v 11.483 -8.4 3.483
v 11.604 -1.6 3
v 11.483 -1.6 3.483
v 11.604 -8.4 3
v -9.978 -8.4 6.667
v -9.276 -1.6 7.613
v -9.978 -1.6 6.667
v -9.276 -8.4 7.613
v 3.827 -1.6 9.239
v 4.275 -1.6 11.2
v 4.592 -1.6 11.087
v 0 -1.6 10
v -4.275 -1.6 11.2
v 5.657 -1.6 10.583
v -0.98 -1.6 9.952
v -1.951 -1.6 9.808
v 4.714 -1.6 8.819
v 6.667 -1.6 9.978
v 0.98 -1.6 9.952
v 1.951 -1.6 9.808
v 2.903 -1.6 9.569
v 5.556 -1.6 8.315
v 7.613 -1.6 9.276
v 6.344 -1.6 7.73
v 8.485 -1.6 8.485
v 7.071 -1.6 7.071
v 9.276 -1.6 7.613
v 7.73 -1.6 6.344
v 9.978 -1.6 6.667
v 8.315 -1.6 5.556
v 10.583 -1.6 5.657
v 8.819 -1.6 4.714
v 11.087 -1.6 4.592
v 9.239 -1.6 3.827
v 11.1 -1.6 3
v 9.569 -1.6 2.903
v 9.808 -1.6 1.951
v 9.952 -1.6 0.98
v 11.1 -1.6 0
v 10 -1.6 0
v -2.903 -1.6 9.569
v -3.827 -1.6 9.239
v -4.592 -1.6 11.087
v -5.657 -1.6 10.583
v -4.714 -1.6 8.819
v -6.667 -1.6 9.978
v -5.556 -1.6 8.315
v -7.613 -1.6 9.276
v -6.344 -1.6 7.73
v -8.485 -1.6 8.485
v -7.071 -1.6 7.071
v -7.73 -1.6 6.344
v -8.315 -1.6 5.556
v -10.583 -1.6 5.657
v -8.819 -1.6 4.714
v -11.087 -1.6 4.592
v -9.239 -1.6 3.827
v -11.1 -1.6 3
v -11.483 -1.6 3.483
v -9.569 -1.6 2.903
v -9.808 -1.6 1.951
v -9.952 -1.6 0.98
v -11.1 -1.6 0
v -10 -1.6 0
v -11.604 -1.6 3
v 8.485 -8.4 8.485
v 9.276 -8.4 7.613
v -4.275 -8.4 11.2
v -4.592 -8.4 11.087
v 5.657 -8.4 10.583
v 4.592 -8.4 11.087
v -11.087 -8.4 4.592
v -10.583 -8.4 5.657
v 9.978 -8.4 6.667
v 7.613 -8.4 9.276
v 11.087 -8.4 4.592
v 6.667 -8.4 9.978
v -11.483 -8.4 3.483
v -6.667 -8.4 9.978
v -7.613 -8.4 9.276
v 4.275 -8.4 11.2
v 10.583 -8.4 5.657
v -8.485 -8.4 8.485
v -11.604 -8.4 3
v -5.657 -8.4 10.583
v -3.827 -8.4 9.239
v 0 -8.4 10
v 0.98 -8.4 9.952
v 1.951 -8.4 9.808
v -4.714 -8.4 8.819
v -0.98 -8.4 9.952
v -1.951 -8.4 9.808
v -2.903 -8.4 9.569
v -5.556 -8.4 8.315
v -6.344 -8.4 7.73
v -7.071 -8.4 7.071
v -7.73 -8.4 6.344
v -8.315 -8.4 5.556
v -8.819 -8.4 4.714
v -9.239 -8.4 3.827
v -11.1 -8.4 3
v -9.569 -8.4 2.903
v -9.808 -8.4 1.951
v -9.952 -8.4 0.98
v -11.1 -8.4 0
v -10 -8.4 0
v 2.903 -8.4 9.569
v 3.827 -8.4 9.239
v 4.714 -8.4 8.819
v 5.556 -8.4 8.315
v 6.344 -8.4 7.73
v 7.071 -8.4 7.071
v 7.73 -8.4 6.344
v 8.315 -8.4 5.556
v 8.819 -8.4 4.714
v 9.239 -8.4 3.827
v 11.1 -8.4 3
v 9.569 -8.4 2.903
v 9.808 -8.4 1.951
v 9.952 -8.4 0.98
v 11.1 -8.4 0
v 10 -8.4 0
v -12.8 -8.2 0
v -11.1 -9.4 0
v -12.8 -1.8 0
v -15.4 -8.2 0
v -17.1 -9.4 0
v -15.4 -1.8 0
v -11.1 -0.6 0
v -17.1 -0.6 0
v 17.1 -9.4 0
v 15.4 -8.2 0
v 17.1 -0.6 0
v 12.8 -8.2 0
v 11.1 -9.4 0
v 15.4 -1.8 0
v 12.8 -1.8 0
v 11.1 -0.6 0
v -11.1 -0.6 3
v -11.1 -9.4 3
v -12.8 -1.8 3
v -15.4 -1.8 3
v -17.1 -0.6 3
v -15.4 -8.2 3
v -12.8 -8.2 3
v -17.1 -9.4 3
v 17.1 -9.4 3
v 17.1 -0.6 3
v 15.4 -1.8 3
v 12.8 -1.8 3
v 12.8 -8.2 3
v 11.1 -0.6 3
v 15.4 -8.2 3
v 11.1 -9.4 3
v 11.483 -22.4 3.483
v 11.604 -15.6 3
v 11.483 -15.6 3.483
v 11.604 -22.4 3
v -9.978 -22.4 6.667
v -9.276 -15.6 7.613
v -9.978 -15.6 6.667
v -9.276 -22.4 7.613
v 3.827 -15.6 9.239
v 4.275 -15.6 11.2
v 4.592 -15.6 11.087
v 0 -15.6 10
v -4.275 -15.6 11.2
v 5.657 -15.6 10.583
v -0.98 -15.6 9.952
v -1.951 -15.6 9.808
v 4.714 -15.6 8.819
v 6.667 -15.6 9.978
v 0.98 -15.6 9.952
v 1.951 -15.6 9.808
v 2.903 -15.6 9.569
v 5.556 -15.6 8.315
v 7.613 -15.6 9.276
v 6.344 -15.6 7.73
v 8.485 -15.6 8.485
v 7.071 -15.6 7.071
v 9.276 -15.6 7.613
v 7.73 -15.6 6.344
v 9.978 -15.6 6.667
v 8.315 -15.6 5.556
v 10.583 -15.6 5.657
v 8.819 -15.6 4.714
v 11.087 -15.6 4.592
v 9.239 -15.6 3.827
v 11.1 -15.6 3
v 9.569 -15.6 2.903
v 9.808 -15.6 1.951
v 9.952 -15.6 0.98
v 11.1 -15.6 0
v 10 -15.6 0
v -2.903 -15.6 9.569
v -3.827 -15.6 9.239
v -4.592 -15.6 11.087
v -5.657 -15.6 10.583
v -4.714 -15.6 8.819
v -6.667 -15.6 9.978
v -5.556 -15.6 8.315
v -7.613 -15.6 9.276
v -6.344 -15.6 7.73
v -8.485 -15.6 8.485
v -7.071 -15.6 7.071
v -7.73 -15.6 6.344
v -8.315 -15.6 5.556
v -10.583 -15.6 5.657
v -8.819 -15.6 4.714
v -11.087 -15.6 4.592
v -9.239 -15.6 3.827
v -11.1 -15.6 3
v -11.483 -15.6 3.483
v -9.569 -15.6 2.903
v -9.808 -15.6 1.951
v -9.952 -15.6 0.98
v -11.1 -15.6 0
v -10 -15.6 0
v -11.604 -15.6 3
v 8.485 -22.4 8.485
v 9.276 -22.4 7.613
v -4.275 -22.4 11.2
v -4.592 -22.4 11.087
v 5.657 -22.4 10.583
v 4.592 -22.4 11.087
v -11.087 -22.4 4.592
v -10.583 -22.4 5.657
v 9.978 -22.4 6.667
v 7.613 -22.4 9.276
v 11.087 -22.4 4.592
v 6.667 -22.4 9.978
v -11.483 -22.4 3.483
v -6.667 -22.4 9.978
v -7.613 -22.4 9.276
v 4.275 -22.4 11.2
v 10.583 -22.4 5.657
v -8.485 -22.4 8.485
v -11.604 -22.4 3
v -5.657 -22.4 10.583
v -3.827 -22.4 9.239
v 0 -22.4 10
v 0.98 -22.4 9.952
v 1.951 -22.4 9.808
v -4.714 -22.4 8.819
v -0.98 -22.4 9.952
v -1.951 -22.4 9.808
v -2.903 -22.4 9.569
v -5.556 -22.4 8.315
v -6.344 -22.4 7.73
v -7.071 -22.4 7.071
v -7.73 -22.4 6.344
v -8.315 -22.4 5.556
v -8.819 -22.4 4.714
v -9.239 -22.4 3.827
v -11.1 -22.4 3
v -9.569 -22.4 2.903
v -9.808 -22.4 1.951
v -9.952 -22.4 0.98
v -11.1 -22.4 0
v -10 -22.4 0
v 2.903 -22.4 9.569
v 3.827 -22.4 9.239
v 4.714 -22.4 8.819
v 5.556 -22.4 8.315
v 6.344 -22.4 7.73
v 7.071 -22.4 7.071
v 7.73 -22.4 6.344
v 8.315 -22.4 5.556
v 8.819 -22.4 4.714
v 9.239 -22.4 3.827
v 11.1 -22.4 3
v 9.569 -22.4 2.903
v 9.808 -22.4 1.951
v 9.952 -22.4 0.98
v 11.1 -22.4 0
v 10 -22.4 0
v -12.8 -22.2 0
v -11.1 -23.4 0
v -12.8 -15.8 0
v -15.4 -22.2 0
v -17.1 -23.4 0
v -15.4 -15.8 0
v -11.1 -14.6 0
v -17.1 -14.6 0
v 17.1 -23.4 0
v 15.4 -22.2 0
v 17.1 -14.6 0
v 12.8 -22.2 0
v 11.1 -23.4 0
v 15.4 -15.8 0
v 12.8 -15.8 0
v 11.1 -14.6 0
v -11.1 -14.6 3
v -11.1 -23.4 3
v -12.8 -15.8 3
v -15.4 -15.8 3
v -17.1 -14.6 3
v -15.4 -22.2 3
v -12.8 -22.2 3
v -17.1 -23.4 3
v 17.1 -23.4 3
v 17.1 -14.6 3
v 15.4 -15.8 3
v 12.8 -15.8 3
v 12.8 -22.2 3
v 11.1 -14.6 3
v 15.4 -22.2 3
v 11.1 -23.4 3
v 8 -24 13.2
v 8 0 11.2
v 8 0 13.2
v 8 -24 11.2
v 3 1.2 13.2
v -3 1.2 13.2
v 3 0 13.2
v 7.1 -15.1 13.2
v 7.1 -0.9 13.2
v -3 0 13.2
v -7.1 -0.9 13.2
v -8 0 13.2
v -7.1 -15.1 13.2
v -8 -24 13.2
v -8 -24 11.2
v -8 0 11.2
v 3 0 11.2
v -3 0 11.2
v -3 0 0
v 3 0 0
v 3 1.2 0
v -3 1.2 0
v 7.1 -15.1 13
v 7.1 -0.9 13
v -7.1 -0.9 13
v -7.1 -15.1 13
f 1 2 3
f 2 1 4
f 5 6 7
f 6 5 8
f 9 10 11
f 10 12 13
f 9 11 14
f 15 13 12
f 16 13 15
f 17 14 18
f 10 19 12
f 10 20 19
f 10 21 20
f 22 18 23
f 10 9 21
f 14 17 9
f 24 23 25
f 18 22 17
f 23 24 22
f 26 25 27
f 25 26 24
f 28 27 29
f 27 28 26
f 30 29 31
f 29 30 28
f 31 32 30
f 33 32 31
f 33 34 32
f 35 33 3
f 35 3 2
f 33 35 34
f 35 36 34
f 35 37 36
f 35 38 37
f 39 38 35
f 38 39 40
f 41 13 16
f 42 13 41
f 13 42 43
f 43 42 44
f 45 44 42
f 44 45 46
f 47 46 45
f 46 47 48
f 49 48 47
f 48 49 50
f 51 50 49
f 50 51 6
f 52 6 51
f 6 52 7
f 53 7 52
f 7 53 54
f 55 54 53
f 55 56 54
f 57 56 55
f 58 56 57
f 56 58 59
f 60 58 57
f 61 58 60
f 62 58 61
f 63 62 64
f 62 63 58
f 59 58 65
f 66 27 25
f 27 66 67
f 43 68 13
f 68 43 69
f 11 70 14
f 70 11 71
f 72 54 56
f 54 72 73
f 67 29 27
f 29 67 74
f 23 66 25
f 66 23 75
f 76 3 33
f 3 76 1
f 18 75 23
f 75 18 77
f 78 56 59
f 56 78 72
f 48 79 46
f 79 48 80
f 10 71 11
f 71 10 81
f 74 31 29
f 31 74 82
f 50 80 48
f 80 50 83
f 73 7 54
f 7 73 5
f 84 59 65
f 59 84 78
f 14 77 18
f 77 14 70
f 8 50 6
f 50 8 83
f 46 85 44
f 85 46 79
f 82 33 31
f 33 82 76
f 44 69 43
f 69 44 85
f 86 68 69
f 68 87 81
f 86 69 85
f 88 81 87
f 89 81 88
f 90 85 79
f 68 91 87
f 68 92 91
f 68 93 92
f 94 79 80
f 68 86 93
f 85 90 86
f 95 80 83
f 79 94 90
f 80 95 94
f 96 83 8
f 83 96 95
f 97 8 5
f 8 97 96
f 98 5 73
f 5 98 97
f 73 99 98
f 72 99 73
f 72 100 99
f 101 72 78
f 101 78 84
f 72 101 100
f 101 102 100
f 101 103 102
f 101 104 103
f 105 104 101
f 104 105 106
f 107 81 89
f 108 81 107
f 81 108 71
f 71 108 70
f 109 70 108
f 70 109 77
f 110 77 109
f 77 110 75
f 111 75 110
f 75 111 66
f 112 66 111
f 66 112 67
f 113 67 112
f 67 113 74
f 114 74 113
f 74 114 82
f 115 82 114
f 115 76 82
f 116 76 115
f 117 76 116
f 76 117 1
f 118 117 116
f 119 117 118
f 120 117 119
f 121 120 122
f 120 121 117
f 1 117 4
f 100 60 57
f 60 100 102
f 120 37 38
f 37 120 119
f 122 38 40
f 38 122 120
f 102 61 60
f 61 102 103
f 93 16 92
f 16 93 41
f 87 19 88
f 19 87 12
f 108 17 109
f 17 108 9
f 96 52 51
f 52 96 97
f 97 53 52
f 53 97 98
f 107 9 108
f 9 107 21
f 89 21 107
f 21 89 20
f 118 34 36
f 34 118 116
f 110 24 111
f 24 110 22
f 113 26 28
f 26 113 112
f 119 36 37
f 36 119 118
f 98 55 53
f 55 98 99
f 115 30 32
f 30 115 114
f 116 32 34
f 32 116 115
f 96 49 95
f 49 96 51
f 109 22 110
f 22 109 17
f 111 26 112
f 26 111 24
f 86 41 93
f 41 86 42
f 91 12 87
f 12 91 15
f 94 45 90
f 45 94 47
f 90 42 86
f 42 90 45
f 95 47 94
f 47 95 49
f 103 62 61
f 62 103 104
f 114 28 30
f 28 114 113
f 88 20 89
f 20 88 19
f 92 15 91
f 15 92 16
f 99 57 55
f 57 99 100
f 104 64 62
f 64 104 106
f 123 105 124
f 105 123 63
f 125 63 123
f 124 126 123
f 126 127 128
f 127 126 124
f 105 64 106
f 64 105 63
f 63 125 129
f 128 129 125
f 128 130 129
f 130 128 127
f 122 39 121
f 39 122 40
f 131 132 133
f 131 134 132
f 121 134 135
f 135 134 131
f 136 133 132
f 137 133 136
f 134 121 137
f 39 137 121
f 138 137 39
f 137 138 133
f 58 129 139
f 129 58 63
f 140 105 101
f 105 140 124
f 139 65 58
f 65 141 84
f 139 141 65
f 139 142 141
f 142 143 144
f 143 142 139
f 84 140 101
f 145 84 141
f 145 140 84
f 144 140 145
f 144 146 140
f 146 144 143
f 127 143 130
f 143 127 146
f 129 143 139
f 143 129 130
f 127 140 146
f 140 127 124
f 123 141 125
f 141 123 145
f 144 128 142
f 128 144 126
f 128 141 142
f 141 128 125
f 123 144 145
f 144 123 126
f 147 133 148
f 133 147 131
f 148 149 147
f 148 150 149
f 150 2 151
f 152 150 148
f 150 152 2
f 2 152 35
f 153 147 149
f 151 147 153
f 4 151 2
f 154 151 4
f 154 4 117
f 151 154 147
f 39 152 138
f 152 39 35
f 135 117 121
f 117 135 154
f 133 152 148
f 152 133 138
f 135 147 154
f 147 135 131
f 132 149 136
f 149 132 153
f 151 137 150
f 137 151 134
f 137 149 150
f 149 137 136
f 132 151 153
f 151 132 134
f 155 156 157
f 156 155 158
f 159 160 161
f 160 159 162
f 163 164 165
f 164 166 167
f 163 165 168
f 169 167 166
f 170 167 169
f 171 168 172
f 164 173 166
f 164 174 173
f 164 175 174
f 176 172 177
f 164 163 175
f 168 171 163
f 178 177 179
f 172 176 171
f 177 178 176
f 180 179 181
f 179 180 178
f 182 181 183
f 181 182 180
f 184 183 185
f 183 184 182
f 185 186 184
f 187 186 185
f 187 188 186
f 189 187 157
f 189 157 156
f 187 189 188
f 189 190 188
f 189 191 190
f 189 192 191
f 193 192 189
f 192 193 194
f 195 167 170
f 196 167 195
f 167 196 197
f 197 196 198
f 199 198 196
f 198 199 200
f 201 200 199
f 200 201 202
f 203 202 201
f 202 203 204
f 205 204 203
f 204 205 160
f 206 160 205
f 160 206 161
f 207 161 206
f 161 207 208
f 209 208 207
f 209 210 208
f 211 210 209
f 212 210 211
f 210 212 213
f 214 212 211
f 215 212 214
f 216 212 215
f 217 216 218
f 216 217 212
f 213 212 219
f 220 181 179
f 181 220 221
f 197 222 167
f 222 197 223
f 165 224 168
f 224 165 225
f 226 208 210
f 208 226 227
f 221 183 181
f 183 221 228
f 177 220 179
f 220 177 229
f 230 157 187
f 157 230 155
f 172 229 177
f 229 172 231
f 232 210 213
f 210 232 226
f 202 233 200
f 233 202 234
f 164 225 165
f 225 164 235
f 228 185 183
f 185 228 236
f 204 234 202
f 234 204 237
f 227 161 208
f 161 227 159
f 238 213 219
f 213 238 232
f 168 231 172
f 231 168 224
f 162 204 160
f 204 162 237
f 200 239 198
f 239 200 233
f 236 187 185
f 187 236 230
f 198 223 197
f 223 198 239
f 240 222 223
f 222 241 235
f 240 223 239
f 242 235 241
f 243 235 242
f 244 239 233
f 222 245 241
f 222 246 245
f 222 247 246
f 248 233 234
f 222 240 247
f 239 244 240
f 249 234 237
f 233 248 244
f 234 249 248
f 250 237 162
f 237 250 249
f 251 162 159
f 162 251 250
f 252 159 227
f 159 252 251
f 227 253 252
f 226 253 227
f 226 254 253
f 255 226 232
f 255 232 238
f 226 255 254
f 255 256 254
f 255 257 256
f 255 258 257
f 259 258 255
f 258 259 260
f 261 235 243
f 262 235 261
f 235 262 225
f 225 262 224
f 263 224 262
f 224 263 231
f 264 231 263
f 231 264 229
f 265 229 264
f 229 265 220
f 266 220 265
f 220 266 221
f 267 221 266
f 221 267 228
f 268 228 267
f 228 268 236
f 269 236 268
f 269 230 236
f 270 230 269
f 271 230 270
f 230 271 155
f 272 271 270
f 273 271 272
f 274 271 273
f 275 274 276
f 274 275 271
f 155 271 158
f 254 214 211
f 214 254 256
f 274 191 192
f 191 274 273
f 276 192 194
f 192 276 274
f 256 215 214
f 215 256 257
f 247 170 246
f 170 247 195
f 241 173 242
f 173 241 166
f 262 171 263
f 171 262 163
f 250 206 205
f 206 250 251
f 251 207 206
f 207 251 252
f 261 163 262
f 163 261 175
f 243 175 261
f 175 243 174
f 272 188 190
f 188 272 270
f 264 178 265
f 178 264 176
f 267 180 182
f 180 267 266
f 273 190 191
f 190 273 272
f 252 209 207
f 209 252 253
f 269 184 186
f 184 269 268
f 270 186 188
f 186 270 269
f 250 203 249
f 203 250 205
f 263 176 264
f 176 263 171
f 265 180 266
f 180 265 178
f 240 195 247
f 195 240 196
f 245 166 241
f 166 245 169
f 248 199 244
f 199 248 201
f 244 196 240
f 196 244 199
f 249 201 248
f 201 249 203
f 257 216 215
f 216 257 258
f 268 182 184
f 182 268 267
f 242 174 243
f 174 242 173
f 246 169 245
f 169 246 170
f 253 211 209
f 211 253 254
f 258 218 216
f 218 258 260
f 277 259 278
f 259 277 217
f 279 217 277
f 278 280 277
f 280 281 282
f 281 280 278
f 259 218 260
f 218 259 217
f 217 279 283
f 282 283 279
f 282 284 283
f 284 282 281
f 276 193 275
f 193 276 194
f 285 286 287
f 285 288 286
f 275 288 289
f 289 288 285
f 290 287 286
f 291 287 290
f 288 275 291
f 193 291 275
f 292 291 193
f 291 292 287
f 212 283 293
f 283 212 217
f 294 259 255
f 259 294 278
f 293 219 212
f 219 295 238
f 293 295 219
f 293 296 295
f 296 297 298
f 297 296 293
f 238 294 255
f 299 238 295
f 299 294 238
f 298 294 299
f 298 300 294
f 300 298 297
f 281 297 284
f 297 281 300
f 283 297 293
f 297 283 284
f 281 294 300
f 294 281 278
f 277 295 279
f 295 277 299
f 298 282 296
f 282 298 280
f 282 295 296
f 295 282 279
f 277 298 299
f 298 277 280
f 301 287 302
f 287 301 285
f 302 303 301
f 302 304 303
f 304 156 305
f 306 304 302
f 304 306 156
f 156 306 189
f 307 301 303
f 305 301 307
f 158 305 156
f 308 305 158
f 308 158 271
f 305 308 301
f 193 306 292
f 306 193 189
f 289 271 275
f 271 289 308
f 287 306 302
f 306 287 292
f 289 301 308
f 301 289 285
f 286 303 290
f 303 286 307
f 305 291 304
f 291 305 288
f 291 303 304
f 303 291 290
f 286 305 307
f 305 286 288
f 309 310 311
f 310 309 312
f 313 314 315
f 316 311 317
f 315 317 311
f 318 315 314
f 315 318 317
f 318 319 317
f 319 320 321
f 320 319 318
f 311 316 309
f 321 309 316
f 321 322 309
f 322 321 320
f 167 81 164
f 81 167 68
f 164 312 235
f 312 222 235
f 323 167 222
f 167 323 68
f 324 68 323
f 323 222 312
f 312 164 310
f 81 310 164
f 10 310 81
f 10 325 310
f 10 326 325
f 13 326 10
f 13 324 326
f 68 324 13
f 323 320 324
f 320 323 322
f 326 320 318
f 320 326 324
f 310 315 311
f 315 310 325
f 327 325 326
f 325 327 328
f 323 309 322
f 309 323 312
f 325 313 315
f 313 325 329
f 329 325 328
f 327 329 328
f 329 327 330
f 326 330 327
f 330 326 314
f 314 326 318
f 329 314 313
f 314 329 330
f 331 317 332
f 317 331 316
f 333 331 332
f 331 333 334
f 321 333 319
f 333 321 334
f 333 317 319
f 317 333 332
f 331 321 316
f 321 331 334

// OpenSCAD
// ReachSense six-finger wrap v1. Units: mm. Experimental, physically unverified.
// R: +X lateral, +Y distal (towards fingertip), +Z dorsal.
// The marker deck's distal edge and the stop's inner contact face are both Y=0.
// The outer stop is Y=1.2; it is NOT the anatomical reference.
// The stop constrains Y only. Anatomical X/Z and placement repeatability are unverified.
$fn = 64;
part = "holder"; // "holder" or "strap"
marker_id = 21;
finger_diameter_mm = 20;
marker_edge_mm = 10;
quiet_zone_mm = 2;
frame_mm = 1;
wall_mm = 2;
stop_wall_mm = 1.2;
strap_width_mm = 6;
strap_length_mm = 90;

r = finger_diameter_mm/2;
tile = marker_edge_mm + 2*quiet_zone_mm;
deck_width = tile + 2*frame_mm;
length = tile + 2*frame_mm + 8;
deck_bottom = r + wall_mm - 0.8;
deck_top = deck_bottom + 2;
pocket_depth = 0.2;
marker_y = -(frame_mm + quiet_zone_mm + marker_edge_mm/2);
support_y = [-5, -length+5];

assert(finger_diameter_mm >= 12 && finger_diameter_mm <= 26, "Choose a 12–26 mm candidate opening");
assert(marker_edge_mm >= 8 && marker_edge_mm <= 16, "Choose an 8–16 mm black edge");
assert(quiet_zone_mm >= 2, "Keep the full white quiet zone");
assert(marker_id >= 0 && marker_id < 100, "DICT_4X4_100 ID required");

module support(y) {
    translate([0,y,0]) intersection() {
        difference() {
            rotate([90,0,0]) cylinder(r=r+wall_mm,h=6.8,center=true);
            rotate([90,0,0]) cylinder(r=r,h=8.8,center=true);
        }
        translate([-r-wall_mm-1,-4.4,0]) cube([2*(r+wall_mm+1),8.8,r+wall_mm+1]);
    }
    // Through-slots for 6 mm hook-and-loop strap or the optional TPU strip.
    for(sign=[-1,1]) translate([sign*(r+wall_mm+2.1),y,1.5]) difference() {
        cube([6,8.8,3],center=true);
        cube([2.6,6.4,5],center=true);
    }
}

module holder() {
    difference() {
        union() {
            for(y=support_y) support(y);
            translate([-deck_width/2,-length,deck_bottom]) cube([deck_width,length,2]);
            // Front stop contacts the fingertip at its INNER face Y=0.
            // Deck ends at Y=0 while this wall extends beyond it, preserving the reference.
            translate([-3,0,0]) cube([6,stop_wall_mm,deck_top]);
        }
        // Shallow square registration recess. Keep all 2 mm white margins visible.
        translate([-tile/2-0.1,marker_y-tile/2-0.1,deck_top-pocket_depth])
            cube([tile+0.2,tile+0.2,pocket_depth+1]);
        // Identity comes from the attached printed marker. Geometry is shared by size.
    }
}

module strap() {
    // TPU-only ladder strip. Its ends need a return loop/fastener or hook-and-loop tape.
    // This is not an articulated hard-plastic chain or a validated locking buckle.
    union() {
        translate([-strap_length_mm/2,-strap_width_mm/2,0])
            cube([strap_length_mm,strap_width_mm,0.8]);
        for(x=[-strap_length_mm/2+3:4:strap_length_mm/2-3])
            translate([x-0.7,-strap_width_mm/2,0.8]) cube([1.4,strap_width_mm,0.5]);
    }
}

if(part == "strap") strap(); else holder();
echo(reference_plane_y_mm=0, outer_stop_y_mm=stop_wall_mm);
echo(marker_center_R_mm=[0,marker_y,deck_top-pocket_depth+0.15]);
echo(marker_center_to_distal_deck_edge_mm=-marker_y);
